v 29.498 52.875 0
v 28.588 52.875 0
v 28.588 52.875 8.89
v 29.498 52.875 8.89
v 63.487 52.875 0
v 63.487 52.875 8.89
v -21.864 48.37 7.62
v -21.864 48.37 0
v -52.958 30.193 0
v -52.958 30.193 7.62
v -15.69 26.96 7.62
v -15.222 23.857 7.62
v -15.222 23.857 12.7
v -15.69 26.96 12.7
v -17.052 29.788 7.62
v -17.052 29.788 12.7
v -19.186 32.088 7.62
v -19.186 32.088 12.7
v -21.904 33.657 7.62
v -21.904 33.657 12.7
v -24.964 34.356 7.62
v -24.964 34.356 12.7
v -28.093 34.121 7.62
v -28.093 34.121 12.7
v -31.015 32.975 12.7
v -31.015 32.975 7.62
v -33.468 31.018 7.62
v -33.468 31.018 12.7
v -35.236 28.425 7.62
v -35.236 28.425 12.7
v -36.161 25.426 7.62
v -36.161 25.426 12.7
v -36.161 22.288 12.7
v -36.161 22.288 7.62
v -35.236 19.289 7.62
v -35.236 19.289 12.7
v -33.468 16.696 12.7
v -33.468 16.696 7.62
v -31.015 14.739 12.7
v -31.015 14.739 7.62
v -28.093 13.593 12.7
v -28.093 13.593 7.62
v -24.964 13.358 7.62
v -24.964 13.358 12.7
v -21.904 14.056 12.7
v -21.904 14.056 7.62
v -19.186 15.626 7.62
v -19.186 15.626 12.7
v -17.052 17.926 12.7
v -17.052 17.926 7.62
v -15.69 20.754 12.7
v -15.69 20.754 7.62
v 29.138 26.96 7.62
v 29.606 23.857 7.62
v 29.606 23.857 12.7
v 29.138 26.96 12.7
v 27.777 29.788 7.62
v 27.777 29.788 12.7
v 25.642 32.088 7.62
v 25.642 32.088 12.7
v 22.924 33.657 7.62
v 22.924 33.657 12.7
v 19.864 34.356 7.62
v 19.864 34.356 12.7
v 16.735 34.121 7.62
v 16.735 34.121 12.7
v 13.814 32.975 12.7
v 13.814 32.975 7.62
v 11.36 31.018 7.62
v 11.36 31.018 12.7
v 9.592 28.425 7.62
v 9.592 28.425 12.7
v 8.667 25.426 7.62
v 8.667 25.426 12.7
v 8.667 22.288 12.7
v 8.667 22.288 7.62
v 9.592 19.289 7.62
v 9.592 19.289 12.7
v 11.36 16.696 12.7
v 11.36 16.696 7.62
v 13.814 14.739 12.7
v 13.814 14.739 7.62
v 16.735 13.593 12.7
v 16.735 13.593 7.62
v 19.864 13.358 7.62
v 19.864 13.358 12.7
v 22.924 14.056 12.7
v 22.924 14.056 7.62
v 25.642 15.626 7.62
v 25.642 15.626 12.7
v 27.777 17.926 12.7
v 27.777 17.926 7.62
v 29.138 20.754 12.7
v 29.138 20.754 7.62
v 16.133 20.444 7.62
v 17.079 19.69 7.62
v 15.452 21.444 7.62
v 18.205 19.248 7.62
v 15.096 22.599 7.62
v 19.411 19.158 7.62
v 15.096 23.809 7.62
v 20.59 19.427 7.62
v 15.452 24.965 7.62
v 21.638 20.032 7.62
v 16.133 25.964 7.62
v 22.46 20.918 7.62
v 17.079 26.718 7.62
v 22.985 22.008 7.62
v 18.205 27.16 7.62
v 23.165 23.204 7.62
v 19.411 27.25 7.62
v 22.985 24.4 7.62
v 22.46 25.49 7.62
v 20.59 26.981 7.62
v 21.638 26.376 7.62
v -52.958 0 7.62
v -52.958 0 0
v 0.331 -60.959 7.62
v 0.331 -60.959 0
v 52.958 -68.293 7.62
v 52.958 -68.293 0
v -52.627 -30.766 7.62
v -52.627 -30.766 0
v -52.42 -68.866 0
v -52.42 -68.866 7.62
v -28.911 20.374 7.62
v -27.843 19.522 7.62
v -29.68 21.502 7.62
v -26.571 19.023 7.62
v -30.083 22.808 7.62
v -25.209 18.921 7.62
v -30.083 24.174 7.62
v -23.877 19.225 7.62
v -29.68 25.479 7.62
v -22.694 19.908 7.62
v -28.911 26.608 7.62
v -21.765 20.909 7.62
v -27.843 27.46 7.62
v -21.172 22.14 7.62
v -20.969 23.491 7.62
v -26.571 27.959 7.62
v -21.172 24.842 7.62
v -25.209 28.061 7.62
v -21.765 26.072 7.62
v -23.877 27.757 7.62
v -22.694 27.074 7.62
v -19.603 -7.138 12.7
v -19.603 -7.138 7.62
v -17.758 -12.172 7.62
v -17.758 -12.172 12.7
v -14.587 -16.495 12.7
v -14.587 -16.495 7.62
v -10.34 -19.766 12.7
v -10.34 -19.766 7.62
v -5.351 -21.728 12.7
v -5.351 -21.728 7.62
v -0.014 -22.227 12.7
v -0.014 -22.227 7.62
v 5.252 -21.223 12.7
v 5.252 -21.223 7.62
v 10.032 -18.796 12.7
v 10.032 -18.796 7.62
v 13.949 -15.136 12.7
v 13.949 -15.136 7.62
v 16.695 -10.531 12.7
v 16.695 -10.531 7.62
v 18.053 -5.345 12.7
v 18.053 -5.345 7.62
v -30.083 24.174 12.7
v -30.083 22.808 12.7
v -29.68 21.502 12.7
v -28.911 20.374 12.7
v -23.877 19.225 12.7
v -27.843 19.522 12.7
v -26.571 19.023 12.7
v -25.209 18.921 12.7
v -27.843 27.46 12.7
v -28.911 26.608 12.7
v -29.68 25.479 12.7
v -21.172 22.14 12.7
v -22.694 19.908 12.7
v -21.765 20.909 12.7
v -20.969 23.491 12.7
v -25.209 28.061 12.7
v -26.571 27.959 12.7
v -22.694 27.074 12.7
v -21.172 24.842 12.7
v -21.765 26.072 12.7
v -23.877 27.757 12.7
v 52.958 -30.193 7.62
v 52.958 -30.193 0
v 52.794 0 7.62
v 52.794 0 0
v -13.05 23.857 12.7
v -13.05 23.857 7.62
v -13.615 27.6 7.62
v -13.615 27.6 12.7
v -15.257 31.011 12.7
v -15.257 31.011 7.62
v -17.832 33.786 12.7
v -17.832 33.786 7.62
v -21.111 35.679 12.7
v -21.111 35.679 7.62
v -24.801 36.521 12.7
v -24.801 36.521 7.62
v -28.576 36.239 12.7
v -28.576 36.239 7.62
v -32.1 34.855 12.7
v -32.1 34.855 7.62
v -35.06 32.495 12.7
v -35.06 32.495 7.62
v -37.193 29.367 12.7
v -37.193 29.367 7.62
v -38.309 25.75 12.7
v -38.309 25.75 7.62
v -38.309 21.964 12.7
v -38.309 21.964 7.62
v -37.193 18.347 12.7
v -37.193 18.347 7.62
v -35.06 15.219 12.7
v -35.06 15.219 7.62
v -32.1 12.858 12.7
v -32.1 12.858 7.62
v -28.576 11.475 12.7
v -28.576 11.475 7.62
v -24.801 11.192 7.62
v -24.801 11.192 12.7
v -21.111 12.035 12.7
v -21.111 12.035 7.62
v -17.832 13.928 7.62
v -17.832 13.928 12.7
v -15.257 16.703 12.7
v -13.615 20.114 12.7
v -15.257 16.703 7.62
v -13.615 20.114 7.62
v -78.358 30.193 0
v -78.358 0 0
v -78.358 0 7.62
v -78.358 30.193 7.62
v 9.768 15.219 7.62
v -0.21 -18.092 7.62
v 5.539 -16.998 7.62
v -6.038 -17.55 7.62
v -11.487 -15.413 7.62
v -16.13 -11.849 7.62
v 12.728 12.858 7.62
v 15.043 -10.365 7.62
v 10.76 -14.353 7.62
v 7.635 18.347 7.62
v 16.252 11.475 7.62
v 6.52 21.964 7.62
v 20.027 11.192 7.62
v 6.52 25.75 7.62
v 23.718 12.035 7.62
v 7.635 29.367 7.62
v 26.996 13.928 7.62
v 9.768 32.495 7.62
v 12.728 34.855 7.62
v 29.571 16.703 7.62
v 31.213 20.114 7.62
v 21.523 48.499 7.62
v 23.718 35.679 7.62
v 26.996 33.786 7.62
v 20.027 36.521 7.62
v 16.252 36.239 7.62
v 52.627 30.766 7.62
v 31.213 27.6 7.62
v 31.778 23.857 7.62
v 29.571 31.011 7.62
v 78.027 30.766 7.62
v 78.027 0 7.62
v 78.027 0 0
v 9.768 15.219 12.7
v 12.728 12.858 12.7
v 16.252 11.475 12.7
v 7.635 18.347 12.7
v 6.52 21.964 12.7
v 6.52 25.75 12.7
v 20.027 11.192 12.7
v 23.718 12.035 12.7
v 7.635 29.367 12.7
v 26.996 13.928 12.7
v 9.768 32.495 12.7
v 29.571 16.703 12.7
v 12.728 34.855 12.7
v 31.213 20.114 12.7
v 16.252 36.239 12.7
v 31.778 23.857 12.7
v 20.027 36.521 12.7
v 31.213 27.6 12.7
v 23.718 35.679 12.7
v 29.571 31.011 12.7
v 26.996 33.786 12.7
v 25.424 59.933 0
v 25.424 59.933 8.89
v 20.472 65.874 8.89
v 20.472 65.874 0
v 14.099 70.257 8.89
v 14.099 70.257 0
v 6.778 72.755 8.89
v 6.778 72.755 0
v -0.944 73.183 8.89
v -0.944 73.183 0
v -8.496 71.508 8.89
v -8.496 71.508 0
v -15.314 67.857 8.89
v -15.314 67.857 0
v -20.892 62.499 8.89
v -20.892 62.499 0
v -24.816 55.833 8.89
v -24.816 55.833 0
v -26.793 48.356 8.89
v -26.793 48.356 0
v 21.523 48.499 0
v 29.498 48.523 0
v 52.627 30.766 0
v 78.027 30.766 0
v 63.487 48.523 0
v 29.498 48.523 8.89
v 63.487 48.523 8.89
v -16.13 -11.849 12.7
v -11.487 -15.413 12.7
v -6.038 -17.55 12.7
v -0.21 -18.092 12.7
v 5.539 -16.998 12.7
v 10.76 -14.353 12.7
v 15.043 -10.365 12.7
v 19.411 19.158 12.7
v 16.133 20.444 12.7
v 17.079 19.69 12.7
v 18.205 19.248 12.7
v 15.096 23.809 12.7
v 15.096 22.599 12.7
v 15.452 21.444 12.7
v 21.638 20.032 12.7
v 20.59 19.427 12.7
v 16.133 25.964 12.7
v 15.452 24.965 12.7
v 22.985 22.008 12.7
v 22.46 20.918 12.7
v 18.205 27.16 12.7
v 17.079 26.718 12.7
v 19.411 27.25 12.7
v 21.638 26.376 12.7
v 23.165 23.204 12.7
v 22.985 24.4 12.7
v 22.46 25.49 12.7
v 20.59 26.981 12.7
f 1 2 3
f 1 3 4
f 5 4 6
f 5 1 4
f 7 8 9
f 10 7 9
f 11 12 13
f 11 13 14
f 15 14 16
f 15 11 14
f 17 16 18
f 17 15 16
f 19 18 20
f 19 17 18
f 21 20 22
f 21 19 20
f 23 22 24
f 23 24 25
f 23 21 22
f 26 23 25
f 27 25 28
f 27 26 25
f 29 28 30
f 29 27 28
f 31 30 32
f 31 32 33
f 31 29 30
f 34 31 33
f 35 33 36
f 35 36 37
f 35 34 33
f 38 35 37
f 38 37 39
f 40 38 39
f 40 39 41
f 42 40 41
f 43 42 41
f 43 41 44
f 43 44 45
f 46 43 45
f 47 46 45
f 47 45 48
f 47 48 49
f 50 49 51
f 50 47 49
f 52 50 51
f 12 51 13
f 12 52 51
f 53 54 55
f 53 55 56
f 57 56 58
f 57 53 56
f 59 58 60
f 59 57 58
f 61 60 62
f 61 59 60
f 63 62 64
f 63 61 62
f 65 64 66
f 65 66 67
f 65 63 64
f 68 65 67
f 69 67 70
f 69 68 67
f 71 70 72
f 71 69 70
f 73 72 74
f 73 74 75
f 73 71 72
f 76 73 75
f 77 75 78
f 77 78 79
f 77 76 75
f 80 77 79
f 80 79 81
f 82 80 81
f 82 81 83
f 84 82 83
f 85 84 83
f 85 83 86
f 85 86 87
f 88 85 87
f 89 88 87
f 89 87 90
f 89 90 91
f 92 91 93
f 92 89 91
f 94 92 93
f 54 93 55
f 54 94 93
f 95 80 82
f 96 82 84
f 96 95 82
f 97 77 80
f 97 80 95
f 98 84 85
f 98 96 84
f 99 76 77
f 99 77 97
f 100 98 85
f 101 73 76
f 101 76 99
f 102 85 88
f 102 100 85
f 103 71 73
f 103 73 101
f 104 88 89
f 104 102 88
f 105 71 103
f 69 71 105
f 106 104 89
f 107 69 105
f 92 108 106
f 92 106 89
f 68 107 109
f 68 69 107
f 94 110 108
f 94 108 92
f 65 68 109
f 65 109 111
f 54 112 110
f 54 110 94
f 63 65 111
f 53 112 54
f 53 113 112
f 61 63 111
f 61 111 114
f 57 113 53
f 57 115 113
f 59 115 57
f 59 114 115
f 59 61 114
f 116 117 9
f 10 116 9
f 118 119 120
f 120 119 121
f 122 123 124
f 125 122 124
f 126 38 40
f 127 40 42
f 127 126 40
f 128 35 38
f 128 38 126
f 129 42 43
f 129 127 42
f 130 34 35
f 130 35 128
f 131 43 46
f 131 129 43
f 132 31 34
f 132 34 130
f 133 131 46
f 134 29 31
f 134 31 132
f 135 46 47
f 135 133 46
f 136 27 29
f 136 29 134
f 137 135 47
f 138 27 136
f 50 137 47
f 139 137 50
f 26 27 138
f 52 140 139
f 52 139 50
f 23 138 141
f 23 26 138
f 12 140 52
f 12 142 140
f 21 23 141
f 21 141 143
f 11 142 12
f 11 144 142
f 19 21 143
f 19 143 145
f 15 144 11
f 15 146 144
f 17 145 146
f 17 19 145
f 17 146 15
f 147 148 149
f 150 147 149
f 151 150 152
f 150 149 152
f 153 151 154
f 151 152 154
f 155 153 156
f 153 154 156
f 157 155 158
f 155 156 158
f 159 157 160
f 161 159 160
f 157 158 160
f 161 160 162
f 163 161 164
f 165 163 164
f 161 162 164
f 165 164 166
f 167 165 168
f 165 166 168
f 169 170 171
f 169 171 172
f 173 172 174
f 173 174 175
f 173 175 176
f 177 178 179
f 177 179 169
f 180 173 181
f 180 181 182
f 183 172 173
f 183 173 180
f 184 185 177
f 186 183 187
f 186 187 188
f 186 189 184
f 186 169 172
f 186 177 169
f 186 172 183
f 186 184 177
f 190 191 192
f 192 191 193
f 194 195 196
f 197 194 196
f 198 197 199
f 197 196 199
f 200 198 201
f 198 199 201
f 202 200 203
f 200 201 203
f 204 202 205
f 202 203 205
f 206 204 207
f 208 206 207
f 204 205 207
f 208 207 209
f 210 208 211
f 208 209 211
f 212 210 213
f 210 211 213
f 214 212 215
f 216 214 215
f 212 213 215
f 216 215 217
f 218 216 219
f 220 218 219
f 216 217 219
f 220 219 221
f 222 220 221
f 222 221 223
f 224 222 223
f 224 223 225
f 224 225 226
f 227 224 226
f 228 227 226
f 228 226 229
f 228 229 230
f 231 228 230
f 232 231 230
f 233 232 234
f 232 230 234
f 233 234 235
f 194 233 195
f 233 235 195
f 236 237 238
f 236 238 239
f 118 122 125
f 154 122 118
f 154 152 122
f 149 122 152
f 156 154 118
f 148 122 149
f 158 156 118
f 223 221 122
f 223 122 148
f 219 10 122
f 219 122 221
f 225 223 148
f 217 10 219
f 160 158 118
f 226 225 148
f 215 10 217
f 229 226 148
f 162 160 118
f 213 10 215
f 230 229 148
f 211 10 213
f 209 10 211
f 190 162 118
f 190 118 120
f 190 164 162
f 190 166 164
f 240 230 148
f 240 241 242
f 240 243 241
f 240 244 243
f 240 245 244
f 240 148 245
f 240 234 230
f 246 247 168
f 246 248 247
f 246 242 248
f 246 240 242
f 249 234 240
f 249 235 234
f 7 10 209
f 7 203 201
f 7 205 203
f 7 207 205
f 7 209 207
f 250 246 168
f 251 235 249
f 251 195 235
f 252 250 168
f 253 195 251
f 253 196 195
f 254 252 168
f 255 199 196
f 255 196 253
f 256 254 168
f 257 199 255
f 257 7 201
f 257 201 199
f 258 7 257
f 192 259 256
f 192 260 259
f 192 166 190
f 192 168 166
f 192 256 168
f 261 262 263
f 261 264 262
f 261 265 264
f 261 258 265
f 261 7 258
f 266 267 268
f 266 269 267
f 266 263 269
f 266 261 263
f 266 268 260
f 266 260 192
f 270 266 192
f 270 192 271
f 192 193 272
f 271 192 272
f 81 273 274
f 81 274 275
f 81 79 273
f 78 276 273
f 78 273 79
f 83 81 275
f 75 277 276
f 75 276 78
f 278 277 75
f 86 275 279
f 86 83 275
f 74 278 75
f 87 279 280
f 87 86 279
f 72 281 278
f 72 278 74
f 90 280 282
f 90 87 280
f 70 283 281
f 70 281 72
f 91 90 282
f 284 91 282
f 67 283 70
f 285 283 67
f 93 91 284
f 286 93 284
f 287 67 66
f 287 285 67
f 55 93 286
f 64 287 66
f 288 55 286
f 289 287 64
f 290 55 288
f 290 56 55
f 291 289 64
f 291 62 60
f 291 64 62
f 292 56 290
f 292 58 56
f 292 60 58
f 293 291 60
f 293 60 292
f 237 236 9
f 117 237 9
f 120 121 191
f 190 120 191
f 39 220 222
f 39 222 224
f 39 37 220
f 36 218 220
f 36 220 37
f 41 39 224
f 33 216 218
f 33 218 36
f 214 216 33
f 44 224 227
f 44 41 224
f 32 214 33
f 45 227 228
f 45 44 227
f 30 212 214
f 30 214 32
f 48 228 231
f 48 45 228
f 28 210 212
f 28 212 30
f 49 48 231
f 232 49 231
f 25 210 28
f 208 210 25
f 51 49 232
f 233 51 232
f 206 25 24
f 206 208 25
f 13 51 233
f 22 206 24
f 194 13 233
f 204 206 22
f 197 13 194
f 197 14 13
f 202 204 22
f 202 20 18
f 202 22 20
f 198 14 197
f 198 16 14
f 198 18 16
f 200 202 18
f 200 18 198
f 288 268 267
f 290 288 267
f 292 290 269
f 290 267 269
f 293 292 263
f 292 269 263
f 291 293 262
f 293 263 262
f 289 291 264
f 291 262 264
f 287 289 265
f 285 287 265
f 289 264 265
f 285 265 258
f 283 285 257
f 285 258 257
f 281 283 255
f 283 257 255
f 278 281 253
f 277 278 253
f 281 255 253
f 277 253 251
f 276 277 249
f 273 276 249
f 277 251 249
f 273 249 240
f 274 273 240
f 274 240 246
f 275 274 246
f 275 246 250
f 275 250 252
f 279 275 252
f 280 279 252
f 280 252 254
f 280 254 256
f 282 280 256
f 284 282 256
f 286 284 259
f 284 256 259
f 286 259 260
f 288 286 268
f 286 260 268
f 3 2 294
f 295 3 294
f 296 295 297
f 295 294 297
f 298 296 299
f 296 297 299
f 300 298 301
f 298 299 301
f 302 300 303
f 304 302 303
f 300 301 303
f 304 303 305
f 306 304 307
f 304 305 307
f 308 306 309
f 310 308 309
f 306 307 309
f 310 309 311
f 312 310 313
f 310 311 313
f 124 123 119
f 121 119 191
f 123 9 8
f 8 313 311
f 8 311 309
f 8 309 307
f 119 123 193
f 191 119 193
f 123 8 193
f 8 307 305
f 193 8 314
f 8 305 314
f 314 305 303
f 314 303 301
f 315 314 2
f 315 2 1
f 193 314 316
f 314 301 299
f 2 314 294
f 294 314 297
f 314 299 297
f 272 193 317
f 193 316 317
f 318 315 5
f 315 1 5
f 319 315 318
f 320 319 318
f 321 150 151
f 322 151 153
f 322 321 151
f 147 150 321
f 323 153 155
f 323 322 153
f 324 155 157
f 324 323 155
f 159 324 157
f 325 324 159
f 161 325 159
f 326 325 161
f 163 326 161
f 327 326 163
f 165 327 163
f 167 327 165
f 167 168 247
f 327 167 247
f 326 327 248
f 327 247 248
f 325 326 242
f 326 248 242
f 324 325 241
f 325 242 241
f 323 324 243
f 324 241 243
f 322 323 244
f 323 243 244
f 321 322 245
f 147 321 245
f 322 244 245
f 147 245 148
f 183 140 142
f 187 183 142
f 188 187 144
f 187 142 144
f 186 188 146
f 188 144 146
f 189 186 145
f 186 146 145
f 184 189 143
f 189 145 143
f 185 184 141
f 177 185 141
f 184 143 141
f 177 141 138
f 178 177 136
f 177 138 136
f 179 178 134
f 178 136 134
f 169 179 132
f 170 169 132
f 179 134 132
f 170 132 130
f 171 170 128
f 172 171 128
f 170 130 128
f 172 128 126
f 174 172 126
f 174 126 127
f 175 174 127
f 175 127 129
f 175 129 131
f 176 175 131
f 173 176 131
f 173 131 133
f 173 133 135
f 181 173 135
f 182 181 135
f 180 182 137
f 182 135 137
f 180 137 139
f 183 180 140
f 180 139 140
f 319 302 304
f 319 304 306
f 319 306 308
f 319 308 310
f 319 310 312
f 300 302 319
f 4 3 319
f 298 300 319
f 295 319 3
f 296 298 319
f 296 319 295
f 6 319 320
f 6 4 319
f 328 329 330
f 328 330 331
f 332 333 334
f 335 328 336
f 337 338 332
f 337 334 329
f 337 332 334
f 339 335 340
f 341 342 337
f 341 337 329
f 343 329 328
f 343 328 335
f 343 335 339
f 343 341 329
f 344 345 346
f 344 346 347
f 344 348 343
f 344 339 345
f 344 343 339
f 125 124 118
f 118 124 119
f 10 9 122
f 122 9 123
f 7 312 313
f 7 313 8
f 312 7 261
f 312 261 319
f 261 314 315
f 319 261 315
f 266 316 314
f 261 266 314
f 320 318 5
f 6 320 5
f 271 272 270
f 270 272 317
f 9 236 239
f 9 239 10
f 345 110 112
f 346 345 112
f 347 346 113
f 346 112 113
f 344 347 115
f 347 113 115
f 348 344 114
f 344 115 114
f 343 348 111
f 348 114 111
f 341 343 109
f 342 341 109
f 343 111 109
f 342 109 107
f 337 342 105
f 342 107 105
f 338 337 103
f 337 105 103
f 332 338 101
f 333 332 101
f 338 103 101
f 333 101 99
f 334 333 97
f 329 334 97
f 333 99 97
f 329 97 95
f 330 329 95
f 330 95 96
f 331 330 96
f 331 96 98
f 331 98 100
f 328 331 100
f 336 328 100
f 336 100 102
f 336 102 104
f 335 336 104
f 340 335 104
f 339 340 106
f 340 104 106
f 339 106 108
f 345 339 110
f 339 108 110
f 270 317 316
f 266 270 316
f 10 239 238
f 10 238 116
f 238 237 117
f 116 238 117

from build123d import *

# Parameters (mm, degrees)
F1_DEPTH = 7.62
F0_W     = 25.4
F0_H     = 30.1927982898
F3_R     = 4.0575582534
F4_DEPTH = 5.08
F5_R     = 4.5826589952
F6_DEPTH = 5.08
F2_R     = 12.7
F2_R_2   = 10.5283
F7_DEPTH = 5.08
F8_W     = 33.9898206294
F8_H     = 4.3518617749
F9_DEPTH = 8.89


with BuildPart() as f1:
    # F0 (on Top) → F1 (new body)
    with BuildSketch(Plane.XY):
        Polygon((52.9576862357, -30.1927982898), (0.3311127876, -60.9591007506), (52.9576862357, -68.2927982898), align=None)
        Polygon((78.0265734481, 30.7663024608), (52.6265734481, 30.7663024608), (52.793687399, 0), (78.0265734481, 0), align=None)
        Polygon((0.3311127876, -60.9591007506), (-52.6265734481, -30.7663024608), (-52.4196279559, -68.86574043), align=None)
        Polygon((-0.3311127876, 60.9591007506), (-52.9576862357, 30.1927982898), (-52.6265734481, -30.7663024608), (0.3311127876, -60.9591007506), (52.9576862357, -30.1927982898), (52.793687399, 0), (52.6265734481, 0), (52.6265734481, 30.7663024608), align=None)
        Polygon((52.793687399, 0), (52.6265734481, 30.7663024608), (52.6265734481, 0), align=None)
    extrude(amount=F1_DEPTH)

    # F3 (on face) → F4 (join)
    with BuildSketch(Plane.XY.offset(7.62)):
        with Locations((19.1078484058, 23.2041683048)):
            Circle(F3_R)
    extrude(amount=F4_DEPTH)

    # F5 (on face) → F6 (join)
    with BuildSketch(Plane.XY.offset(7.62)):
        with Locations((-25.5514662713, 23.4908163548)):
            Circle(F5_R)
    extrude(amount=F6_DEPTH)

    # F2 (on face) → F7 (join)
    with BuildSketch(Plane.XY.offset(7.62)):
        with Locations((-25.7504637512, 23.8569705008)):
            Circle(F2_R)
        with Locations((-25.7504637512, 23.8569705008)):
            Circle(F2_R_2, mode=Mode.SUBTRACT)
        with Locations((19.0776889999, 23.8569705008)):
            Circle(F2_R)
        with Locations((19.0776889999, 23.8569705008)):
            Circle(F2_R_2, mode=Mode.SUBTRACT)
        with BuildLine():
            ThreePointArc((18.0530462825, -5.3453690513), (-0.210471102, -18.0923947301), (-19.6026036841, -7.1384947474))
            ThreePointArc((-19.6026036841, -7.1384947474), (-0.0135704098, -22.2273104033), (18.0530462825, -5.3453690513))
        make_face()
    extrude(amount=F7_DEPTH)

    # F8 (on Top) → F9 (join)
    with BuildSketch(Plane.XY):
        with Locations((46.4924927801, 50.6991408765)):
            Rectangle(F8_W, F8_H)
        with BuildLine():
            ThreePointArc((28.5875461377, 52.875071764), (29.1279584343, 50.7169980069), (29.4975824654, 48.5232099891))
            Line((29.4975824654, 48.5232099891), (29.4975824654, 52.875071764))
            Line((29.4975824654, 52.875071764), (28.5875461377, 52.875071764))
        make_face()
        with BuildLine():
            Line((-26.7930161208, 48.3558252454), (29.4975824654, 48.5232099891))
            ThreePointArc((29.4975824654, 48.5232099891), (29.1279584343, 50.7169980069), (28.5875461377, 52.875071764))
            ThreePointArc((28.5875461377, 52.875071764), (-0.9442997447, 73.1826820121), (-26.7930161208, 48.3558252454))
        make_face()
    extrude(amount=F9_DEPTH)


with BuildPart() as f1b:
    # F0 (on Top) → F1, piece 2 (new body)
    with BuildSketch(Plane.XY):
        with Locations((-65.6576862357, 15.0963991449)):
            Rectangle(F0_W, F0_H)
    extrude(amount=F1_DEPTH)


solid = Compound([f1.part, f1b.part])
